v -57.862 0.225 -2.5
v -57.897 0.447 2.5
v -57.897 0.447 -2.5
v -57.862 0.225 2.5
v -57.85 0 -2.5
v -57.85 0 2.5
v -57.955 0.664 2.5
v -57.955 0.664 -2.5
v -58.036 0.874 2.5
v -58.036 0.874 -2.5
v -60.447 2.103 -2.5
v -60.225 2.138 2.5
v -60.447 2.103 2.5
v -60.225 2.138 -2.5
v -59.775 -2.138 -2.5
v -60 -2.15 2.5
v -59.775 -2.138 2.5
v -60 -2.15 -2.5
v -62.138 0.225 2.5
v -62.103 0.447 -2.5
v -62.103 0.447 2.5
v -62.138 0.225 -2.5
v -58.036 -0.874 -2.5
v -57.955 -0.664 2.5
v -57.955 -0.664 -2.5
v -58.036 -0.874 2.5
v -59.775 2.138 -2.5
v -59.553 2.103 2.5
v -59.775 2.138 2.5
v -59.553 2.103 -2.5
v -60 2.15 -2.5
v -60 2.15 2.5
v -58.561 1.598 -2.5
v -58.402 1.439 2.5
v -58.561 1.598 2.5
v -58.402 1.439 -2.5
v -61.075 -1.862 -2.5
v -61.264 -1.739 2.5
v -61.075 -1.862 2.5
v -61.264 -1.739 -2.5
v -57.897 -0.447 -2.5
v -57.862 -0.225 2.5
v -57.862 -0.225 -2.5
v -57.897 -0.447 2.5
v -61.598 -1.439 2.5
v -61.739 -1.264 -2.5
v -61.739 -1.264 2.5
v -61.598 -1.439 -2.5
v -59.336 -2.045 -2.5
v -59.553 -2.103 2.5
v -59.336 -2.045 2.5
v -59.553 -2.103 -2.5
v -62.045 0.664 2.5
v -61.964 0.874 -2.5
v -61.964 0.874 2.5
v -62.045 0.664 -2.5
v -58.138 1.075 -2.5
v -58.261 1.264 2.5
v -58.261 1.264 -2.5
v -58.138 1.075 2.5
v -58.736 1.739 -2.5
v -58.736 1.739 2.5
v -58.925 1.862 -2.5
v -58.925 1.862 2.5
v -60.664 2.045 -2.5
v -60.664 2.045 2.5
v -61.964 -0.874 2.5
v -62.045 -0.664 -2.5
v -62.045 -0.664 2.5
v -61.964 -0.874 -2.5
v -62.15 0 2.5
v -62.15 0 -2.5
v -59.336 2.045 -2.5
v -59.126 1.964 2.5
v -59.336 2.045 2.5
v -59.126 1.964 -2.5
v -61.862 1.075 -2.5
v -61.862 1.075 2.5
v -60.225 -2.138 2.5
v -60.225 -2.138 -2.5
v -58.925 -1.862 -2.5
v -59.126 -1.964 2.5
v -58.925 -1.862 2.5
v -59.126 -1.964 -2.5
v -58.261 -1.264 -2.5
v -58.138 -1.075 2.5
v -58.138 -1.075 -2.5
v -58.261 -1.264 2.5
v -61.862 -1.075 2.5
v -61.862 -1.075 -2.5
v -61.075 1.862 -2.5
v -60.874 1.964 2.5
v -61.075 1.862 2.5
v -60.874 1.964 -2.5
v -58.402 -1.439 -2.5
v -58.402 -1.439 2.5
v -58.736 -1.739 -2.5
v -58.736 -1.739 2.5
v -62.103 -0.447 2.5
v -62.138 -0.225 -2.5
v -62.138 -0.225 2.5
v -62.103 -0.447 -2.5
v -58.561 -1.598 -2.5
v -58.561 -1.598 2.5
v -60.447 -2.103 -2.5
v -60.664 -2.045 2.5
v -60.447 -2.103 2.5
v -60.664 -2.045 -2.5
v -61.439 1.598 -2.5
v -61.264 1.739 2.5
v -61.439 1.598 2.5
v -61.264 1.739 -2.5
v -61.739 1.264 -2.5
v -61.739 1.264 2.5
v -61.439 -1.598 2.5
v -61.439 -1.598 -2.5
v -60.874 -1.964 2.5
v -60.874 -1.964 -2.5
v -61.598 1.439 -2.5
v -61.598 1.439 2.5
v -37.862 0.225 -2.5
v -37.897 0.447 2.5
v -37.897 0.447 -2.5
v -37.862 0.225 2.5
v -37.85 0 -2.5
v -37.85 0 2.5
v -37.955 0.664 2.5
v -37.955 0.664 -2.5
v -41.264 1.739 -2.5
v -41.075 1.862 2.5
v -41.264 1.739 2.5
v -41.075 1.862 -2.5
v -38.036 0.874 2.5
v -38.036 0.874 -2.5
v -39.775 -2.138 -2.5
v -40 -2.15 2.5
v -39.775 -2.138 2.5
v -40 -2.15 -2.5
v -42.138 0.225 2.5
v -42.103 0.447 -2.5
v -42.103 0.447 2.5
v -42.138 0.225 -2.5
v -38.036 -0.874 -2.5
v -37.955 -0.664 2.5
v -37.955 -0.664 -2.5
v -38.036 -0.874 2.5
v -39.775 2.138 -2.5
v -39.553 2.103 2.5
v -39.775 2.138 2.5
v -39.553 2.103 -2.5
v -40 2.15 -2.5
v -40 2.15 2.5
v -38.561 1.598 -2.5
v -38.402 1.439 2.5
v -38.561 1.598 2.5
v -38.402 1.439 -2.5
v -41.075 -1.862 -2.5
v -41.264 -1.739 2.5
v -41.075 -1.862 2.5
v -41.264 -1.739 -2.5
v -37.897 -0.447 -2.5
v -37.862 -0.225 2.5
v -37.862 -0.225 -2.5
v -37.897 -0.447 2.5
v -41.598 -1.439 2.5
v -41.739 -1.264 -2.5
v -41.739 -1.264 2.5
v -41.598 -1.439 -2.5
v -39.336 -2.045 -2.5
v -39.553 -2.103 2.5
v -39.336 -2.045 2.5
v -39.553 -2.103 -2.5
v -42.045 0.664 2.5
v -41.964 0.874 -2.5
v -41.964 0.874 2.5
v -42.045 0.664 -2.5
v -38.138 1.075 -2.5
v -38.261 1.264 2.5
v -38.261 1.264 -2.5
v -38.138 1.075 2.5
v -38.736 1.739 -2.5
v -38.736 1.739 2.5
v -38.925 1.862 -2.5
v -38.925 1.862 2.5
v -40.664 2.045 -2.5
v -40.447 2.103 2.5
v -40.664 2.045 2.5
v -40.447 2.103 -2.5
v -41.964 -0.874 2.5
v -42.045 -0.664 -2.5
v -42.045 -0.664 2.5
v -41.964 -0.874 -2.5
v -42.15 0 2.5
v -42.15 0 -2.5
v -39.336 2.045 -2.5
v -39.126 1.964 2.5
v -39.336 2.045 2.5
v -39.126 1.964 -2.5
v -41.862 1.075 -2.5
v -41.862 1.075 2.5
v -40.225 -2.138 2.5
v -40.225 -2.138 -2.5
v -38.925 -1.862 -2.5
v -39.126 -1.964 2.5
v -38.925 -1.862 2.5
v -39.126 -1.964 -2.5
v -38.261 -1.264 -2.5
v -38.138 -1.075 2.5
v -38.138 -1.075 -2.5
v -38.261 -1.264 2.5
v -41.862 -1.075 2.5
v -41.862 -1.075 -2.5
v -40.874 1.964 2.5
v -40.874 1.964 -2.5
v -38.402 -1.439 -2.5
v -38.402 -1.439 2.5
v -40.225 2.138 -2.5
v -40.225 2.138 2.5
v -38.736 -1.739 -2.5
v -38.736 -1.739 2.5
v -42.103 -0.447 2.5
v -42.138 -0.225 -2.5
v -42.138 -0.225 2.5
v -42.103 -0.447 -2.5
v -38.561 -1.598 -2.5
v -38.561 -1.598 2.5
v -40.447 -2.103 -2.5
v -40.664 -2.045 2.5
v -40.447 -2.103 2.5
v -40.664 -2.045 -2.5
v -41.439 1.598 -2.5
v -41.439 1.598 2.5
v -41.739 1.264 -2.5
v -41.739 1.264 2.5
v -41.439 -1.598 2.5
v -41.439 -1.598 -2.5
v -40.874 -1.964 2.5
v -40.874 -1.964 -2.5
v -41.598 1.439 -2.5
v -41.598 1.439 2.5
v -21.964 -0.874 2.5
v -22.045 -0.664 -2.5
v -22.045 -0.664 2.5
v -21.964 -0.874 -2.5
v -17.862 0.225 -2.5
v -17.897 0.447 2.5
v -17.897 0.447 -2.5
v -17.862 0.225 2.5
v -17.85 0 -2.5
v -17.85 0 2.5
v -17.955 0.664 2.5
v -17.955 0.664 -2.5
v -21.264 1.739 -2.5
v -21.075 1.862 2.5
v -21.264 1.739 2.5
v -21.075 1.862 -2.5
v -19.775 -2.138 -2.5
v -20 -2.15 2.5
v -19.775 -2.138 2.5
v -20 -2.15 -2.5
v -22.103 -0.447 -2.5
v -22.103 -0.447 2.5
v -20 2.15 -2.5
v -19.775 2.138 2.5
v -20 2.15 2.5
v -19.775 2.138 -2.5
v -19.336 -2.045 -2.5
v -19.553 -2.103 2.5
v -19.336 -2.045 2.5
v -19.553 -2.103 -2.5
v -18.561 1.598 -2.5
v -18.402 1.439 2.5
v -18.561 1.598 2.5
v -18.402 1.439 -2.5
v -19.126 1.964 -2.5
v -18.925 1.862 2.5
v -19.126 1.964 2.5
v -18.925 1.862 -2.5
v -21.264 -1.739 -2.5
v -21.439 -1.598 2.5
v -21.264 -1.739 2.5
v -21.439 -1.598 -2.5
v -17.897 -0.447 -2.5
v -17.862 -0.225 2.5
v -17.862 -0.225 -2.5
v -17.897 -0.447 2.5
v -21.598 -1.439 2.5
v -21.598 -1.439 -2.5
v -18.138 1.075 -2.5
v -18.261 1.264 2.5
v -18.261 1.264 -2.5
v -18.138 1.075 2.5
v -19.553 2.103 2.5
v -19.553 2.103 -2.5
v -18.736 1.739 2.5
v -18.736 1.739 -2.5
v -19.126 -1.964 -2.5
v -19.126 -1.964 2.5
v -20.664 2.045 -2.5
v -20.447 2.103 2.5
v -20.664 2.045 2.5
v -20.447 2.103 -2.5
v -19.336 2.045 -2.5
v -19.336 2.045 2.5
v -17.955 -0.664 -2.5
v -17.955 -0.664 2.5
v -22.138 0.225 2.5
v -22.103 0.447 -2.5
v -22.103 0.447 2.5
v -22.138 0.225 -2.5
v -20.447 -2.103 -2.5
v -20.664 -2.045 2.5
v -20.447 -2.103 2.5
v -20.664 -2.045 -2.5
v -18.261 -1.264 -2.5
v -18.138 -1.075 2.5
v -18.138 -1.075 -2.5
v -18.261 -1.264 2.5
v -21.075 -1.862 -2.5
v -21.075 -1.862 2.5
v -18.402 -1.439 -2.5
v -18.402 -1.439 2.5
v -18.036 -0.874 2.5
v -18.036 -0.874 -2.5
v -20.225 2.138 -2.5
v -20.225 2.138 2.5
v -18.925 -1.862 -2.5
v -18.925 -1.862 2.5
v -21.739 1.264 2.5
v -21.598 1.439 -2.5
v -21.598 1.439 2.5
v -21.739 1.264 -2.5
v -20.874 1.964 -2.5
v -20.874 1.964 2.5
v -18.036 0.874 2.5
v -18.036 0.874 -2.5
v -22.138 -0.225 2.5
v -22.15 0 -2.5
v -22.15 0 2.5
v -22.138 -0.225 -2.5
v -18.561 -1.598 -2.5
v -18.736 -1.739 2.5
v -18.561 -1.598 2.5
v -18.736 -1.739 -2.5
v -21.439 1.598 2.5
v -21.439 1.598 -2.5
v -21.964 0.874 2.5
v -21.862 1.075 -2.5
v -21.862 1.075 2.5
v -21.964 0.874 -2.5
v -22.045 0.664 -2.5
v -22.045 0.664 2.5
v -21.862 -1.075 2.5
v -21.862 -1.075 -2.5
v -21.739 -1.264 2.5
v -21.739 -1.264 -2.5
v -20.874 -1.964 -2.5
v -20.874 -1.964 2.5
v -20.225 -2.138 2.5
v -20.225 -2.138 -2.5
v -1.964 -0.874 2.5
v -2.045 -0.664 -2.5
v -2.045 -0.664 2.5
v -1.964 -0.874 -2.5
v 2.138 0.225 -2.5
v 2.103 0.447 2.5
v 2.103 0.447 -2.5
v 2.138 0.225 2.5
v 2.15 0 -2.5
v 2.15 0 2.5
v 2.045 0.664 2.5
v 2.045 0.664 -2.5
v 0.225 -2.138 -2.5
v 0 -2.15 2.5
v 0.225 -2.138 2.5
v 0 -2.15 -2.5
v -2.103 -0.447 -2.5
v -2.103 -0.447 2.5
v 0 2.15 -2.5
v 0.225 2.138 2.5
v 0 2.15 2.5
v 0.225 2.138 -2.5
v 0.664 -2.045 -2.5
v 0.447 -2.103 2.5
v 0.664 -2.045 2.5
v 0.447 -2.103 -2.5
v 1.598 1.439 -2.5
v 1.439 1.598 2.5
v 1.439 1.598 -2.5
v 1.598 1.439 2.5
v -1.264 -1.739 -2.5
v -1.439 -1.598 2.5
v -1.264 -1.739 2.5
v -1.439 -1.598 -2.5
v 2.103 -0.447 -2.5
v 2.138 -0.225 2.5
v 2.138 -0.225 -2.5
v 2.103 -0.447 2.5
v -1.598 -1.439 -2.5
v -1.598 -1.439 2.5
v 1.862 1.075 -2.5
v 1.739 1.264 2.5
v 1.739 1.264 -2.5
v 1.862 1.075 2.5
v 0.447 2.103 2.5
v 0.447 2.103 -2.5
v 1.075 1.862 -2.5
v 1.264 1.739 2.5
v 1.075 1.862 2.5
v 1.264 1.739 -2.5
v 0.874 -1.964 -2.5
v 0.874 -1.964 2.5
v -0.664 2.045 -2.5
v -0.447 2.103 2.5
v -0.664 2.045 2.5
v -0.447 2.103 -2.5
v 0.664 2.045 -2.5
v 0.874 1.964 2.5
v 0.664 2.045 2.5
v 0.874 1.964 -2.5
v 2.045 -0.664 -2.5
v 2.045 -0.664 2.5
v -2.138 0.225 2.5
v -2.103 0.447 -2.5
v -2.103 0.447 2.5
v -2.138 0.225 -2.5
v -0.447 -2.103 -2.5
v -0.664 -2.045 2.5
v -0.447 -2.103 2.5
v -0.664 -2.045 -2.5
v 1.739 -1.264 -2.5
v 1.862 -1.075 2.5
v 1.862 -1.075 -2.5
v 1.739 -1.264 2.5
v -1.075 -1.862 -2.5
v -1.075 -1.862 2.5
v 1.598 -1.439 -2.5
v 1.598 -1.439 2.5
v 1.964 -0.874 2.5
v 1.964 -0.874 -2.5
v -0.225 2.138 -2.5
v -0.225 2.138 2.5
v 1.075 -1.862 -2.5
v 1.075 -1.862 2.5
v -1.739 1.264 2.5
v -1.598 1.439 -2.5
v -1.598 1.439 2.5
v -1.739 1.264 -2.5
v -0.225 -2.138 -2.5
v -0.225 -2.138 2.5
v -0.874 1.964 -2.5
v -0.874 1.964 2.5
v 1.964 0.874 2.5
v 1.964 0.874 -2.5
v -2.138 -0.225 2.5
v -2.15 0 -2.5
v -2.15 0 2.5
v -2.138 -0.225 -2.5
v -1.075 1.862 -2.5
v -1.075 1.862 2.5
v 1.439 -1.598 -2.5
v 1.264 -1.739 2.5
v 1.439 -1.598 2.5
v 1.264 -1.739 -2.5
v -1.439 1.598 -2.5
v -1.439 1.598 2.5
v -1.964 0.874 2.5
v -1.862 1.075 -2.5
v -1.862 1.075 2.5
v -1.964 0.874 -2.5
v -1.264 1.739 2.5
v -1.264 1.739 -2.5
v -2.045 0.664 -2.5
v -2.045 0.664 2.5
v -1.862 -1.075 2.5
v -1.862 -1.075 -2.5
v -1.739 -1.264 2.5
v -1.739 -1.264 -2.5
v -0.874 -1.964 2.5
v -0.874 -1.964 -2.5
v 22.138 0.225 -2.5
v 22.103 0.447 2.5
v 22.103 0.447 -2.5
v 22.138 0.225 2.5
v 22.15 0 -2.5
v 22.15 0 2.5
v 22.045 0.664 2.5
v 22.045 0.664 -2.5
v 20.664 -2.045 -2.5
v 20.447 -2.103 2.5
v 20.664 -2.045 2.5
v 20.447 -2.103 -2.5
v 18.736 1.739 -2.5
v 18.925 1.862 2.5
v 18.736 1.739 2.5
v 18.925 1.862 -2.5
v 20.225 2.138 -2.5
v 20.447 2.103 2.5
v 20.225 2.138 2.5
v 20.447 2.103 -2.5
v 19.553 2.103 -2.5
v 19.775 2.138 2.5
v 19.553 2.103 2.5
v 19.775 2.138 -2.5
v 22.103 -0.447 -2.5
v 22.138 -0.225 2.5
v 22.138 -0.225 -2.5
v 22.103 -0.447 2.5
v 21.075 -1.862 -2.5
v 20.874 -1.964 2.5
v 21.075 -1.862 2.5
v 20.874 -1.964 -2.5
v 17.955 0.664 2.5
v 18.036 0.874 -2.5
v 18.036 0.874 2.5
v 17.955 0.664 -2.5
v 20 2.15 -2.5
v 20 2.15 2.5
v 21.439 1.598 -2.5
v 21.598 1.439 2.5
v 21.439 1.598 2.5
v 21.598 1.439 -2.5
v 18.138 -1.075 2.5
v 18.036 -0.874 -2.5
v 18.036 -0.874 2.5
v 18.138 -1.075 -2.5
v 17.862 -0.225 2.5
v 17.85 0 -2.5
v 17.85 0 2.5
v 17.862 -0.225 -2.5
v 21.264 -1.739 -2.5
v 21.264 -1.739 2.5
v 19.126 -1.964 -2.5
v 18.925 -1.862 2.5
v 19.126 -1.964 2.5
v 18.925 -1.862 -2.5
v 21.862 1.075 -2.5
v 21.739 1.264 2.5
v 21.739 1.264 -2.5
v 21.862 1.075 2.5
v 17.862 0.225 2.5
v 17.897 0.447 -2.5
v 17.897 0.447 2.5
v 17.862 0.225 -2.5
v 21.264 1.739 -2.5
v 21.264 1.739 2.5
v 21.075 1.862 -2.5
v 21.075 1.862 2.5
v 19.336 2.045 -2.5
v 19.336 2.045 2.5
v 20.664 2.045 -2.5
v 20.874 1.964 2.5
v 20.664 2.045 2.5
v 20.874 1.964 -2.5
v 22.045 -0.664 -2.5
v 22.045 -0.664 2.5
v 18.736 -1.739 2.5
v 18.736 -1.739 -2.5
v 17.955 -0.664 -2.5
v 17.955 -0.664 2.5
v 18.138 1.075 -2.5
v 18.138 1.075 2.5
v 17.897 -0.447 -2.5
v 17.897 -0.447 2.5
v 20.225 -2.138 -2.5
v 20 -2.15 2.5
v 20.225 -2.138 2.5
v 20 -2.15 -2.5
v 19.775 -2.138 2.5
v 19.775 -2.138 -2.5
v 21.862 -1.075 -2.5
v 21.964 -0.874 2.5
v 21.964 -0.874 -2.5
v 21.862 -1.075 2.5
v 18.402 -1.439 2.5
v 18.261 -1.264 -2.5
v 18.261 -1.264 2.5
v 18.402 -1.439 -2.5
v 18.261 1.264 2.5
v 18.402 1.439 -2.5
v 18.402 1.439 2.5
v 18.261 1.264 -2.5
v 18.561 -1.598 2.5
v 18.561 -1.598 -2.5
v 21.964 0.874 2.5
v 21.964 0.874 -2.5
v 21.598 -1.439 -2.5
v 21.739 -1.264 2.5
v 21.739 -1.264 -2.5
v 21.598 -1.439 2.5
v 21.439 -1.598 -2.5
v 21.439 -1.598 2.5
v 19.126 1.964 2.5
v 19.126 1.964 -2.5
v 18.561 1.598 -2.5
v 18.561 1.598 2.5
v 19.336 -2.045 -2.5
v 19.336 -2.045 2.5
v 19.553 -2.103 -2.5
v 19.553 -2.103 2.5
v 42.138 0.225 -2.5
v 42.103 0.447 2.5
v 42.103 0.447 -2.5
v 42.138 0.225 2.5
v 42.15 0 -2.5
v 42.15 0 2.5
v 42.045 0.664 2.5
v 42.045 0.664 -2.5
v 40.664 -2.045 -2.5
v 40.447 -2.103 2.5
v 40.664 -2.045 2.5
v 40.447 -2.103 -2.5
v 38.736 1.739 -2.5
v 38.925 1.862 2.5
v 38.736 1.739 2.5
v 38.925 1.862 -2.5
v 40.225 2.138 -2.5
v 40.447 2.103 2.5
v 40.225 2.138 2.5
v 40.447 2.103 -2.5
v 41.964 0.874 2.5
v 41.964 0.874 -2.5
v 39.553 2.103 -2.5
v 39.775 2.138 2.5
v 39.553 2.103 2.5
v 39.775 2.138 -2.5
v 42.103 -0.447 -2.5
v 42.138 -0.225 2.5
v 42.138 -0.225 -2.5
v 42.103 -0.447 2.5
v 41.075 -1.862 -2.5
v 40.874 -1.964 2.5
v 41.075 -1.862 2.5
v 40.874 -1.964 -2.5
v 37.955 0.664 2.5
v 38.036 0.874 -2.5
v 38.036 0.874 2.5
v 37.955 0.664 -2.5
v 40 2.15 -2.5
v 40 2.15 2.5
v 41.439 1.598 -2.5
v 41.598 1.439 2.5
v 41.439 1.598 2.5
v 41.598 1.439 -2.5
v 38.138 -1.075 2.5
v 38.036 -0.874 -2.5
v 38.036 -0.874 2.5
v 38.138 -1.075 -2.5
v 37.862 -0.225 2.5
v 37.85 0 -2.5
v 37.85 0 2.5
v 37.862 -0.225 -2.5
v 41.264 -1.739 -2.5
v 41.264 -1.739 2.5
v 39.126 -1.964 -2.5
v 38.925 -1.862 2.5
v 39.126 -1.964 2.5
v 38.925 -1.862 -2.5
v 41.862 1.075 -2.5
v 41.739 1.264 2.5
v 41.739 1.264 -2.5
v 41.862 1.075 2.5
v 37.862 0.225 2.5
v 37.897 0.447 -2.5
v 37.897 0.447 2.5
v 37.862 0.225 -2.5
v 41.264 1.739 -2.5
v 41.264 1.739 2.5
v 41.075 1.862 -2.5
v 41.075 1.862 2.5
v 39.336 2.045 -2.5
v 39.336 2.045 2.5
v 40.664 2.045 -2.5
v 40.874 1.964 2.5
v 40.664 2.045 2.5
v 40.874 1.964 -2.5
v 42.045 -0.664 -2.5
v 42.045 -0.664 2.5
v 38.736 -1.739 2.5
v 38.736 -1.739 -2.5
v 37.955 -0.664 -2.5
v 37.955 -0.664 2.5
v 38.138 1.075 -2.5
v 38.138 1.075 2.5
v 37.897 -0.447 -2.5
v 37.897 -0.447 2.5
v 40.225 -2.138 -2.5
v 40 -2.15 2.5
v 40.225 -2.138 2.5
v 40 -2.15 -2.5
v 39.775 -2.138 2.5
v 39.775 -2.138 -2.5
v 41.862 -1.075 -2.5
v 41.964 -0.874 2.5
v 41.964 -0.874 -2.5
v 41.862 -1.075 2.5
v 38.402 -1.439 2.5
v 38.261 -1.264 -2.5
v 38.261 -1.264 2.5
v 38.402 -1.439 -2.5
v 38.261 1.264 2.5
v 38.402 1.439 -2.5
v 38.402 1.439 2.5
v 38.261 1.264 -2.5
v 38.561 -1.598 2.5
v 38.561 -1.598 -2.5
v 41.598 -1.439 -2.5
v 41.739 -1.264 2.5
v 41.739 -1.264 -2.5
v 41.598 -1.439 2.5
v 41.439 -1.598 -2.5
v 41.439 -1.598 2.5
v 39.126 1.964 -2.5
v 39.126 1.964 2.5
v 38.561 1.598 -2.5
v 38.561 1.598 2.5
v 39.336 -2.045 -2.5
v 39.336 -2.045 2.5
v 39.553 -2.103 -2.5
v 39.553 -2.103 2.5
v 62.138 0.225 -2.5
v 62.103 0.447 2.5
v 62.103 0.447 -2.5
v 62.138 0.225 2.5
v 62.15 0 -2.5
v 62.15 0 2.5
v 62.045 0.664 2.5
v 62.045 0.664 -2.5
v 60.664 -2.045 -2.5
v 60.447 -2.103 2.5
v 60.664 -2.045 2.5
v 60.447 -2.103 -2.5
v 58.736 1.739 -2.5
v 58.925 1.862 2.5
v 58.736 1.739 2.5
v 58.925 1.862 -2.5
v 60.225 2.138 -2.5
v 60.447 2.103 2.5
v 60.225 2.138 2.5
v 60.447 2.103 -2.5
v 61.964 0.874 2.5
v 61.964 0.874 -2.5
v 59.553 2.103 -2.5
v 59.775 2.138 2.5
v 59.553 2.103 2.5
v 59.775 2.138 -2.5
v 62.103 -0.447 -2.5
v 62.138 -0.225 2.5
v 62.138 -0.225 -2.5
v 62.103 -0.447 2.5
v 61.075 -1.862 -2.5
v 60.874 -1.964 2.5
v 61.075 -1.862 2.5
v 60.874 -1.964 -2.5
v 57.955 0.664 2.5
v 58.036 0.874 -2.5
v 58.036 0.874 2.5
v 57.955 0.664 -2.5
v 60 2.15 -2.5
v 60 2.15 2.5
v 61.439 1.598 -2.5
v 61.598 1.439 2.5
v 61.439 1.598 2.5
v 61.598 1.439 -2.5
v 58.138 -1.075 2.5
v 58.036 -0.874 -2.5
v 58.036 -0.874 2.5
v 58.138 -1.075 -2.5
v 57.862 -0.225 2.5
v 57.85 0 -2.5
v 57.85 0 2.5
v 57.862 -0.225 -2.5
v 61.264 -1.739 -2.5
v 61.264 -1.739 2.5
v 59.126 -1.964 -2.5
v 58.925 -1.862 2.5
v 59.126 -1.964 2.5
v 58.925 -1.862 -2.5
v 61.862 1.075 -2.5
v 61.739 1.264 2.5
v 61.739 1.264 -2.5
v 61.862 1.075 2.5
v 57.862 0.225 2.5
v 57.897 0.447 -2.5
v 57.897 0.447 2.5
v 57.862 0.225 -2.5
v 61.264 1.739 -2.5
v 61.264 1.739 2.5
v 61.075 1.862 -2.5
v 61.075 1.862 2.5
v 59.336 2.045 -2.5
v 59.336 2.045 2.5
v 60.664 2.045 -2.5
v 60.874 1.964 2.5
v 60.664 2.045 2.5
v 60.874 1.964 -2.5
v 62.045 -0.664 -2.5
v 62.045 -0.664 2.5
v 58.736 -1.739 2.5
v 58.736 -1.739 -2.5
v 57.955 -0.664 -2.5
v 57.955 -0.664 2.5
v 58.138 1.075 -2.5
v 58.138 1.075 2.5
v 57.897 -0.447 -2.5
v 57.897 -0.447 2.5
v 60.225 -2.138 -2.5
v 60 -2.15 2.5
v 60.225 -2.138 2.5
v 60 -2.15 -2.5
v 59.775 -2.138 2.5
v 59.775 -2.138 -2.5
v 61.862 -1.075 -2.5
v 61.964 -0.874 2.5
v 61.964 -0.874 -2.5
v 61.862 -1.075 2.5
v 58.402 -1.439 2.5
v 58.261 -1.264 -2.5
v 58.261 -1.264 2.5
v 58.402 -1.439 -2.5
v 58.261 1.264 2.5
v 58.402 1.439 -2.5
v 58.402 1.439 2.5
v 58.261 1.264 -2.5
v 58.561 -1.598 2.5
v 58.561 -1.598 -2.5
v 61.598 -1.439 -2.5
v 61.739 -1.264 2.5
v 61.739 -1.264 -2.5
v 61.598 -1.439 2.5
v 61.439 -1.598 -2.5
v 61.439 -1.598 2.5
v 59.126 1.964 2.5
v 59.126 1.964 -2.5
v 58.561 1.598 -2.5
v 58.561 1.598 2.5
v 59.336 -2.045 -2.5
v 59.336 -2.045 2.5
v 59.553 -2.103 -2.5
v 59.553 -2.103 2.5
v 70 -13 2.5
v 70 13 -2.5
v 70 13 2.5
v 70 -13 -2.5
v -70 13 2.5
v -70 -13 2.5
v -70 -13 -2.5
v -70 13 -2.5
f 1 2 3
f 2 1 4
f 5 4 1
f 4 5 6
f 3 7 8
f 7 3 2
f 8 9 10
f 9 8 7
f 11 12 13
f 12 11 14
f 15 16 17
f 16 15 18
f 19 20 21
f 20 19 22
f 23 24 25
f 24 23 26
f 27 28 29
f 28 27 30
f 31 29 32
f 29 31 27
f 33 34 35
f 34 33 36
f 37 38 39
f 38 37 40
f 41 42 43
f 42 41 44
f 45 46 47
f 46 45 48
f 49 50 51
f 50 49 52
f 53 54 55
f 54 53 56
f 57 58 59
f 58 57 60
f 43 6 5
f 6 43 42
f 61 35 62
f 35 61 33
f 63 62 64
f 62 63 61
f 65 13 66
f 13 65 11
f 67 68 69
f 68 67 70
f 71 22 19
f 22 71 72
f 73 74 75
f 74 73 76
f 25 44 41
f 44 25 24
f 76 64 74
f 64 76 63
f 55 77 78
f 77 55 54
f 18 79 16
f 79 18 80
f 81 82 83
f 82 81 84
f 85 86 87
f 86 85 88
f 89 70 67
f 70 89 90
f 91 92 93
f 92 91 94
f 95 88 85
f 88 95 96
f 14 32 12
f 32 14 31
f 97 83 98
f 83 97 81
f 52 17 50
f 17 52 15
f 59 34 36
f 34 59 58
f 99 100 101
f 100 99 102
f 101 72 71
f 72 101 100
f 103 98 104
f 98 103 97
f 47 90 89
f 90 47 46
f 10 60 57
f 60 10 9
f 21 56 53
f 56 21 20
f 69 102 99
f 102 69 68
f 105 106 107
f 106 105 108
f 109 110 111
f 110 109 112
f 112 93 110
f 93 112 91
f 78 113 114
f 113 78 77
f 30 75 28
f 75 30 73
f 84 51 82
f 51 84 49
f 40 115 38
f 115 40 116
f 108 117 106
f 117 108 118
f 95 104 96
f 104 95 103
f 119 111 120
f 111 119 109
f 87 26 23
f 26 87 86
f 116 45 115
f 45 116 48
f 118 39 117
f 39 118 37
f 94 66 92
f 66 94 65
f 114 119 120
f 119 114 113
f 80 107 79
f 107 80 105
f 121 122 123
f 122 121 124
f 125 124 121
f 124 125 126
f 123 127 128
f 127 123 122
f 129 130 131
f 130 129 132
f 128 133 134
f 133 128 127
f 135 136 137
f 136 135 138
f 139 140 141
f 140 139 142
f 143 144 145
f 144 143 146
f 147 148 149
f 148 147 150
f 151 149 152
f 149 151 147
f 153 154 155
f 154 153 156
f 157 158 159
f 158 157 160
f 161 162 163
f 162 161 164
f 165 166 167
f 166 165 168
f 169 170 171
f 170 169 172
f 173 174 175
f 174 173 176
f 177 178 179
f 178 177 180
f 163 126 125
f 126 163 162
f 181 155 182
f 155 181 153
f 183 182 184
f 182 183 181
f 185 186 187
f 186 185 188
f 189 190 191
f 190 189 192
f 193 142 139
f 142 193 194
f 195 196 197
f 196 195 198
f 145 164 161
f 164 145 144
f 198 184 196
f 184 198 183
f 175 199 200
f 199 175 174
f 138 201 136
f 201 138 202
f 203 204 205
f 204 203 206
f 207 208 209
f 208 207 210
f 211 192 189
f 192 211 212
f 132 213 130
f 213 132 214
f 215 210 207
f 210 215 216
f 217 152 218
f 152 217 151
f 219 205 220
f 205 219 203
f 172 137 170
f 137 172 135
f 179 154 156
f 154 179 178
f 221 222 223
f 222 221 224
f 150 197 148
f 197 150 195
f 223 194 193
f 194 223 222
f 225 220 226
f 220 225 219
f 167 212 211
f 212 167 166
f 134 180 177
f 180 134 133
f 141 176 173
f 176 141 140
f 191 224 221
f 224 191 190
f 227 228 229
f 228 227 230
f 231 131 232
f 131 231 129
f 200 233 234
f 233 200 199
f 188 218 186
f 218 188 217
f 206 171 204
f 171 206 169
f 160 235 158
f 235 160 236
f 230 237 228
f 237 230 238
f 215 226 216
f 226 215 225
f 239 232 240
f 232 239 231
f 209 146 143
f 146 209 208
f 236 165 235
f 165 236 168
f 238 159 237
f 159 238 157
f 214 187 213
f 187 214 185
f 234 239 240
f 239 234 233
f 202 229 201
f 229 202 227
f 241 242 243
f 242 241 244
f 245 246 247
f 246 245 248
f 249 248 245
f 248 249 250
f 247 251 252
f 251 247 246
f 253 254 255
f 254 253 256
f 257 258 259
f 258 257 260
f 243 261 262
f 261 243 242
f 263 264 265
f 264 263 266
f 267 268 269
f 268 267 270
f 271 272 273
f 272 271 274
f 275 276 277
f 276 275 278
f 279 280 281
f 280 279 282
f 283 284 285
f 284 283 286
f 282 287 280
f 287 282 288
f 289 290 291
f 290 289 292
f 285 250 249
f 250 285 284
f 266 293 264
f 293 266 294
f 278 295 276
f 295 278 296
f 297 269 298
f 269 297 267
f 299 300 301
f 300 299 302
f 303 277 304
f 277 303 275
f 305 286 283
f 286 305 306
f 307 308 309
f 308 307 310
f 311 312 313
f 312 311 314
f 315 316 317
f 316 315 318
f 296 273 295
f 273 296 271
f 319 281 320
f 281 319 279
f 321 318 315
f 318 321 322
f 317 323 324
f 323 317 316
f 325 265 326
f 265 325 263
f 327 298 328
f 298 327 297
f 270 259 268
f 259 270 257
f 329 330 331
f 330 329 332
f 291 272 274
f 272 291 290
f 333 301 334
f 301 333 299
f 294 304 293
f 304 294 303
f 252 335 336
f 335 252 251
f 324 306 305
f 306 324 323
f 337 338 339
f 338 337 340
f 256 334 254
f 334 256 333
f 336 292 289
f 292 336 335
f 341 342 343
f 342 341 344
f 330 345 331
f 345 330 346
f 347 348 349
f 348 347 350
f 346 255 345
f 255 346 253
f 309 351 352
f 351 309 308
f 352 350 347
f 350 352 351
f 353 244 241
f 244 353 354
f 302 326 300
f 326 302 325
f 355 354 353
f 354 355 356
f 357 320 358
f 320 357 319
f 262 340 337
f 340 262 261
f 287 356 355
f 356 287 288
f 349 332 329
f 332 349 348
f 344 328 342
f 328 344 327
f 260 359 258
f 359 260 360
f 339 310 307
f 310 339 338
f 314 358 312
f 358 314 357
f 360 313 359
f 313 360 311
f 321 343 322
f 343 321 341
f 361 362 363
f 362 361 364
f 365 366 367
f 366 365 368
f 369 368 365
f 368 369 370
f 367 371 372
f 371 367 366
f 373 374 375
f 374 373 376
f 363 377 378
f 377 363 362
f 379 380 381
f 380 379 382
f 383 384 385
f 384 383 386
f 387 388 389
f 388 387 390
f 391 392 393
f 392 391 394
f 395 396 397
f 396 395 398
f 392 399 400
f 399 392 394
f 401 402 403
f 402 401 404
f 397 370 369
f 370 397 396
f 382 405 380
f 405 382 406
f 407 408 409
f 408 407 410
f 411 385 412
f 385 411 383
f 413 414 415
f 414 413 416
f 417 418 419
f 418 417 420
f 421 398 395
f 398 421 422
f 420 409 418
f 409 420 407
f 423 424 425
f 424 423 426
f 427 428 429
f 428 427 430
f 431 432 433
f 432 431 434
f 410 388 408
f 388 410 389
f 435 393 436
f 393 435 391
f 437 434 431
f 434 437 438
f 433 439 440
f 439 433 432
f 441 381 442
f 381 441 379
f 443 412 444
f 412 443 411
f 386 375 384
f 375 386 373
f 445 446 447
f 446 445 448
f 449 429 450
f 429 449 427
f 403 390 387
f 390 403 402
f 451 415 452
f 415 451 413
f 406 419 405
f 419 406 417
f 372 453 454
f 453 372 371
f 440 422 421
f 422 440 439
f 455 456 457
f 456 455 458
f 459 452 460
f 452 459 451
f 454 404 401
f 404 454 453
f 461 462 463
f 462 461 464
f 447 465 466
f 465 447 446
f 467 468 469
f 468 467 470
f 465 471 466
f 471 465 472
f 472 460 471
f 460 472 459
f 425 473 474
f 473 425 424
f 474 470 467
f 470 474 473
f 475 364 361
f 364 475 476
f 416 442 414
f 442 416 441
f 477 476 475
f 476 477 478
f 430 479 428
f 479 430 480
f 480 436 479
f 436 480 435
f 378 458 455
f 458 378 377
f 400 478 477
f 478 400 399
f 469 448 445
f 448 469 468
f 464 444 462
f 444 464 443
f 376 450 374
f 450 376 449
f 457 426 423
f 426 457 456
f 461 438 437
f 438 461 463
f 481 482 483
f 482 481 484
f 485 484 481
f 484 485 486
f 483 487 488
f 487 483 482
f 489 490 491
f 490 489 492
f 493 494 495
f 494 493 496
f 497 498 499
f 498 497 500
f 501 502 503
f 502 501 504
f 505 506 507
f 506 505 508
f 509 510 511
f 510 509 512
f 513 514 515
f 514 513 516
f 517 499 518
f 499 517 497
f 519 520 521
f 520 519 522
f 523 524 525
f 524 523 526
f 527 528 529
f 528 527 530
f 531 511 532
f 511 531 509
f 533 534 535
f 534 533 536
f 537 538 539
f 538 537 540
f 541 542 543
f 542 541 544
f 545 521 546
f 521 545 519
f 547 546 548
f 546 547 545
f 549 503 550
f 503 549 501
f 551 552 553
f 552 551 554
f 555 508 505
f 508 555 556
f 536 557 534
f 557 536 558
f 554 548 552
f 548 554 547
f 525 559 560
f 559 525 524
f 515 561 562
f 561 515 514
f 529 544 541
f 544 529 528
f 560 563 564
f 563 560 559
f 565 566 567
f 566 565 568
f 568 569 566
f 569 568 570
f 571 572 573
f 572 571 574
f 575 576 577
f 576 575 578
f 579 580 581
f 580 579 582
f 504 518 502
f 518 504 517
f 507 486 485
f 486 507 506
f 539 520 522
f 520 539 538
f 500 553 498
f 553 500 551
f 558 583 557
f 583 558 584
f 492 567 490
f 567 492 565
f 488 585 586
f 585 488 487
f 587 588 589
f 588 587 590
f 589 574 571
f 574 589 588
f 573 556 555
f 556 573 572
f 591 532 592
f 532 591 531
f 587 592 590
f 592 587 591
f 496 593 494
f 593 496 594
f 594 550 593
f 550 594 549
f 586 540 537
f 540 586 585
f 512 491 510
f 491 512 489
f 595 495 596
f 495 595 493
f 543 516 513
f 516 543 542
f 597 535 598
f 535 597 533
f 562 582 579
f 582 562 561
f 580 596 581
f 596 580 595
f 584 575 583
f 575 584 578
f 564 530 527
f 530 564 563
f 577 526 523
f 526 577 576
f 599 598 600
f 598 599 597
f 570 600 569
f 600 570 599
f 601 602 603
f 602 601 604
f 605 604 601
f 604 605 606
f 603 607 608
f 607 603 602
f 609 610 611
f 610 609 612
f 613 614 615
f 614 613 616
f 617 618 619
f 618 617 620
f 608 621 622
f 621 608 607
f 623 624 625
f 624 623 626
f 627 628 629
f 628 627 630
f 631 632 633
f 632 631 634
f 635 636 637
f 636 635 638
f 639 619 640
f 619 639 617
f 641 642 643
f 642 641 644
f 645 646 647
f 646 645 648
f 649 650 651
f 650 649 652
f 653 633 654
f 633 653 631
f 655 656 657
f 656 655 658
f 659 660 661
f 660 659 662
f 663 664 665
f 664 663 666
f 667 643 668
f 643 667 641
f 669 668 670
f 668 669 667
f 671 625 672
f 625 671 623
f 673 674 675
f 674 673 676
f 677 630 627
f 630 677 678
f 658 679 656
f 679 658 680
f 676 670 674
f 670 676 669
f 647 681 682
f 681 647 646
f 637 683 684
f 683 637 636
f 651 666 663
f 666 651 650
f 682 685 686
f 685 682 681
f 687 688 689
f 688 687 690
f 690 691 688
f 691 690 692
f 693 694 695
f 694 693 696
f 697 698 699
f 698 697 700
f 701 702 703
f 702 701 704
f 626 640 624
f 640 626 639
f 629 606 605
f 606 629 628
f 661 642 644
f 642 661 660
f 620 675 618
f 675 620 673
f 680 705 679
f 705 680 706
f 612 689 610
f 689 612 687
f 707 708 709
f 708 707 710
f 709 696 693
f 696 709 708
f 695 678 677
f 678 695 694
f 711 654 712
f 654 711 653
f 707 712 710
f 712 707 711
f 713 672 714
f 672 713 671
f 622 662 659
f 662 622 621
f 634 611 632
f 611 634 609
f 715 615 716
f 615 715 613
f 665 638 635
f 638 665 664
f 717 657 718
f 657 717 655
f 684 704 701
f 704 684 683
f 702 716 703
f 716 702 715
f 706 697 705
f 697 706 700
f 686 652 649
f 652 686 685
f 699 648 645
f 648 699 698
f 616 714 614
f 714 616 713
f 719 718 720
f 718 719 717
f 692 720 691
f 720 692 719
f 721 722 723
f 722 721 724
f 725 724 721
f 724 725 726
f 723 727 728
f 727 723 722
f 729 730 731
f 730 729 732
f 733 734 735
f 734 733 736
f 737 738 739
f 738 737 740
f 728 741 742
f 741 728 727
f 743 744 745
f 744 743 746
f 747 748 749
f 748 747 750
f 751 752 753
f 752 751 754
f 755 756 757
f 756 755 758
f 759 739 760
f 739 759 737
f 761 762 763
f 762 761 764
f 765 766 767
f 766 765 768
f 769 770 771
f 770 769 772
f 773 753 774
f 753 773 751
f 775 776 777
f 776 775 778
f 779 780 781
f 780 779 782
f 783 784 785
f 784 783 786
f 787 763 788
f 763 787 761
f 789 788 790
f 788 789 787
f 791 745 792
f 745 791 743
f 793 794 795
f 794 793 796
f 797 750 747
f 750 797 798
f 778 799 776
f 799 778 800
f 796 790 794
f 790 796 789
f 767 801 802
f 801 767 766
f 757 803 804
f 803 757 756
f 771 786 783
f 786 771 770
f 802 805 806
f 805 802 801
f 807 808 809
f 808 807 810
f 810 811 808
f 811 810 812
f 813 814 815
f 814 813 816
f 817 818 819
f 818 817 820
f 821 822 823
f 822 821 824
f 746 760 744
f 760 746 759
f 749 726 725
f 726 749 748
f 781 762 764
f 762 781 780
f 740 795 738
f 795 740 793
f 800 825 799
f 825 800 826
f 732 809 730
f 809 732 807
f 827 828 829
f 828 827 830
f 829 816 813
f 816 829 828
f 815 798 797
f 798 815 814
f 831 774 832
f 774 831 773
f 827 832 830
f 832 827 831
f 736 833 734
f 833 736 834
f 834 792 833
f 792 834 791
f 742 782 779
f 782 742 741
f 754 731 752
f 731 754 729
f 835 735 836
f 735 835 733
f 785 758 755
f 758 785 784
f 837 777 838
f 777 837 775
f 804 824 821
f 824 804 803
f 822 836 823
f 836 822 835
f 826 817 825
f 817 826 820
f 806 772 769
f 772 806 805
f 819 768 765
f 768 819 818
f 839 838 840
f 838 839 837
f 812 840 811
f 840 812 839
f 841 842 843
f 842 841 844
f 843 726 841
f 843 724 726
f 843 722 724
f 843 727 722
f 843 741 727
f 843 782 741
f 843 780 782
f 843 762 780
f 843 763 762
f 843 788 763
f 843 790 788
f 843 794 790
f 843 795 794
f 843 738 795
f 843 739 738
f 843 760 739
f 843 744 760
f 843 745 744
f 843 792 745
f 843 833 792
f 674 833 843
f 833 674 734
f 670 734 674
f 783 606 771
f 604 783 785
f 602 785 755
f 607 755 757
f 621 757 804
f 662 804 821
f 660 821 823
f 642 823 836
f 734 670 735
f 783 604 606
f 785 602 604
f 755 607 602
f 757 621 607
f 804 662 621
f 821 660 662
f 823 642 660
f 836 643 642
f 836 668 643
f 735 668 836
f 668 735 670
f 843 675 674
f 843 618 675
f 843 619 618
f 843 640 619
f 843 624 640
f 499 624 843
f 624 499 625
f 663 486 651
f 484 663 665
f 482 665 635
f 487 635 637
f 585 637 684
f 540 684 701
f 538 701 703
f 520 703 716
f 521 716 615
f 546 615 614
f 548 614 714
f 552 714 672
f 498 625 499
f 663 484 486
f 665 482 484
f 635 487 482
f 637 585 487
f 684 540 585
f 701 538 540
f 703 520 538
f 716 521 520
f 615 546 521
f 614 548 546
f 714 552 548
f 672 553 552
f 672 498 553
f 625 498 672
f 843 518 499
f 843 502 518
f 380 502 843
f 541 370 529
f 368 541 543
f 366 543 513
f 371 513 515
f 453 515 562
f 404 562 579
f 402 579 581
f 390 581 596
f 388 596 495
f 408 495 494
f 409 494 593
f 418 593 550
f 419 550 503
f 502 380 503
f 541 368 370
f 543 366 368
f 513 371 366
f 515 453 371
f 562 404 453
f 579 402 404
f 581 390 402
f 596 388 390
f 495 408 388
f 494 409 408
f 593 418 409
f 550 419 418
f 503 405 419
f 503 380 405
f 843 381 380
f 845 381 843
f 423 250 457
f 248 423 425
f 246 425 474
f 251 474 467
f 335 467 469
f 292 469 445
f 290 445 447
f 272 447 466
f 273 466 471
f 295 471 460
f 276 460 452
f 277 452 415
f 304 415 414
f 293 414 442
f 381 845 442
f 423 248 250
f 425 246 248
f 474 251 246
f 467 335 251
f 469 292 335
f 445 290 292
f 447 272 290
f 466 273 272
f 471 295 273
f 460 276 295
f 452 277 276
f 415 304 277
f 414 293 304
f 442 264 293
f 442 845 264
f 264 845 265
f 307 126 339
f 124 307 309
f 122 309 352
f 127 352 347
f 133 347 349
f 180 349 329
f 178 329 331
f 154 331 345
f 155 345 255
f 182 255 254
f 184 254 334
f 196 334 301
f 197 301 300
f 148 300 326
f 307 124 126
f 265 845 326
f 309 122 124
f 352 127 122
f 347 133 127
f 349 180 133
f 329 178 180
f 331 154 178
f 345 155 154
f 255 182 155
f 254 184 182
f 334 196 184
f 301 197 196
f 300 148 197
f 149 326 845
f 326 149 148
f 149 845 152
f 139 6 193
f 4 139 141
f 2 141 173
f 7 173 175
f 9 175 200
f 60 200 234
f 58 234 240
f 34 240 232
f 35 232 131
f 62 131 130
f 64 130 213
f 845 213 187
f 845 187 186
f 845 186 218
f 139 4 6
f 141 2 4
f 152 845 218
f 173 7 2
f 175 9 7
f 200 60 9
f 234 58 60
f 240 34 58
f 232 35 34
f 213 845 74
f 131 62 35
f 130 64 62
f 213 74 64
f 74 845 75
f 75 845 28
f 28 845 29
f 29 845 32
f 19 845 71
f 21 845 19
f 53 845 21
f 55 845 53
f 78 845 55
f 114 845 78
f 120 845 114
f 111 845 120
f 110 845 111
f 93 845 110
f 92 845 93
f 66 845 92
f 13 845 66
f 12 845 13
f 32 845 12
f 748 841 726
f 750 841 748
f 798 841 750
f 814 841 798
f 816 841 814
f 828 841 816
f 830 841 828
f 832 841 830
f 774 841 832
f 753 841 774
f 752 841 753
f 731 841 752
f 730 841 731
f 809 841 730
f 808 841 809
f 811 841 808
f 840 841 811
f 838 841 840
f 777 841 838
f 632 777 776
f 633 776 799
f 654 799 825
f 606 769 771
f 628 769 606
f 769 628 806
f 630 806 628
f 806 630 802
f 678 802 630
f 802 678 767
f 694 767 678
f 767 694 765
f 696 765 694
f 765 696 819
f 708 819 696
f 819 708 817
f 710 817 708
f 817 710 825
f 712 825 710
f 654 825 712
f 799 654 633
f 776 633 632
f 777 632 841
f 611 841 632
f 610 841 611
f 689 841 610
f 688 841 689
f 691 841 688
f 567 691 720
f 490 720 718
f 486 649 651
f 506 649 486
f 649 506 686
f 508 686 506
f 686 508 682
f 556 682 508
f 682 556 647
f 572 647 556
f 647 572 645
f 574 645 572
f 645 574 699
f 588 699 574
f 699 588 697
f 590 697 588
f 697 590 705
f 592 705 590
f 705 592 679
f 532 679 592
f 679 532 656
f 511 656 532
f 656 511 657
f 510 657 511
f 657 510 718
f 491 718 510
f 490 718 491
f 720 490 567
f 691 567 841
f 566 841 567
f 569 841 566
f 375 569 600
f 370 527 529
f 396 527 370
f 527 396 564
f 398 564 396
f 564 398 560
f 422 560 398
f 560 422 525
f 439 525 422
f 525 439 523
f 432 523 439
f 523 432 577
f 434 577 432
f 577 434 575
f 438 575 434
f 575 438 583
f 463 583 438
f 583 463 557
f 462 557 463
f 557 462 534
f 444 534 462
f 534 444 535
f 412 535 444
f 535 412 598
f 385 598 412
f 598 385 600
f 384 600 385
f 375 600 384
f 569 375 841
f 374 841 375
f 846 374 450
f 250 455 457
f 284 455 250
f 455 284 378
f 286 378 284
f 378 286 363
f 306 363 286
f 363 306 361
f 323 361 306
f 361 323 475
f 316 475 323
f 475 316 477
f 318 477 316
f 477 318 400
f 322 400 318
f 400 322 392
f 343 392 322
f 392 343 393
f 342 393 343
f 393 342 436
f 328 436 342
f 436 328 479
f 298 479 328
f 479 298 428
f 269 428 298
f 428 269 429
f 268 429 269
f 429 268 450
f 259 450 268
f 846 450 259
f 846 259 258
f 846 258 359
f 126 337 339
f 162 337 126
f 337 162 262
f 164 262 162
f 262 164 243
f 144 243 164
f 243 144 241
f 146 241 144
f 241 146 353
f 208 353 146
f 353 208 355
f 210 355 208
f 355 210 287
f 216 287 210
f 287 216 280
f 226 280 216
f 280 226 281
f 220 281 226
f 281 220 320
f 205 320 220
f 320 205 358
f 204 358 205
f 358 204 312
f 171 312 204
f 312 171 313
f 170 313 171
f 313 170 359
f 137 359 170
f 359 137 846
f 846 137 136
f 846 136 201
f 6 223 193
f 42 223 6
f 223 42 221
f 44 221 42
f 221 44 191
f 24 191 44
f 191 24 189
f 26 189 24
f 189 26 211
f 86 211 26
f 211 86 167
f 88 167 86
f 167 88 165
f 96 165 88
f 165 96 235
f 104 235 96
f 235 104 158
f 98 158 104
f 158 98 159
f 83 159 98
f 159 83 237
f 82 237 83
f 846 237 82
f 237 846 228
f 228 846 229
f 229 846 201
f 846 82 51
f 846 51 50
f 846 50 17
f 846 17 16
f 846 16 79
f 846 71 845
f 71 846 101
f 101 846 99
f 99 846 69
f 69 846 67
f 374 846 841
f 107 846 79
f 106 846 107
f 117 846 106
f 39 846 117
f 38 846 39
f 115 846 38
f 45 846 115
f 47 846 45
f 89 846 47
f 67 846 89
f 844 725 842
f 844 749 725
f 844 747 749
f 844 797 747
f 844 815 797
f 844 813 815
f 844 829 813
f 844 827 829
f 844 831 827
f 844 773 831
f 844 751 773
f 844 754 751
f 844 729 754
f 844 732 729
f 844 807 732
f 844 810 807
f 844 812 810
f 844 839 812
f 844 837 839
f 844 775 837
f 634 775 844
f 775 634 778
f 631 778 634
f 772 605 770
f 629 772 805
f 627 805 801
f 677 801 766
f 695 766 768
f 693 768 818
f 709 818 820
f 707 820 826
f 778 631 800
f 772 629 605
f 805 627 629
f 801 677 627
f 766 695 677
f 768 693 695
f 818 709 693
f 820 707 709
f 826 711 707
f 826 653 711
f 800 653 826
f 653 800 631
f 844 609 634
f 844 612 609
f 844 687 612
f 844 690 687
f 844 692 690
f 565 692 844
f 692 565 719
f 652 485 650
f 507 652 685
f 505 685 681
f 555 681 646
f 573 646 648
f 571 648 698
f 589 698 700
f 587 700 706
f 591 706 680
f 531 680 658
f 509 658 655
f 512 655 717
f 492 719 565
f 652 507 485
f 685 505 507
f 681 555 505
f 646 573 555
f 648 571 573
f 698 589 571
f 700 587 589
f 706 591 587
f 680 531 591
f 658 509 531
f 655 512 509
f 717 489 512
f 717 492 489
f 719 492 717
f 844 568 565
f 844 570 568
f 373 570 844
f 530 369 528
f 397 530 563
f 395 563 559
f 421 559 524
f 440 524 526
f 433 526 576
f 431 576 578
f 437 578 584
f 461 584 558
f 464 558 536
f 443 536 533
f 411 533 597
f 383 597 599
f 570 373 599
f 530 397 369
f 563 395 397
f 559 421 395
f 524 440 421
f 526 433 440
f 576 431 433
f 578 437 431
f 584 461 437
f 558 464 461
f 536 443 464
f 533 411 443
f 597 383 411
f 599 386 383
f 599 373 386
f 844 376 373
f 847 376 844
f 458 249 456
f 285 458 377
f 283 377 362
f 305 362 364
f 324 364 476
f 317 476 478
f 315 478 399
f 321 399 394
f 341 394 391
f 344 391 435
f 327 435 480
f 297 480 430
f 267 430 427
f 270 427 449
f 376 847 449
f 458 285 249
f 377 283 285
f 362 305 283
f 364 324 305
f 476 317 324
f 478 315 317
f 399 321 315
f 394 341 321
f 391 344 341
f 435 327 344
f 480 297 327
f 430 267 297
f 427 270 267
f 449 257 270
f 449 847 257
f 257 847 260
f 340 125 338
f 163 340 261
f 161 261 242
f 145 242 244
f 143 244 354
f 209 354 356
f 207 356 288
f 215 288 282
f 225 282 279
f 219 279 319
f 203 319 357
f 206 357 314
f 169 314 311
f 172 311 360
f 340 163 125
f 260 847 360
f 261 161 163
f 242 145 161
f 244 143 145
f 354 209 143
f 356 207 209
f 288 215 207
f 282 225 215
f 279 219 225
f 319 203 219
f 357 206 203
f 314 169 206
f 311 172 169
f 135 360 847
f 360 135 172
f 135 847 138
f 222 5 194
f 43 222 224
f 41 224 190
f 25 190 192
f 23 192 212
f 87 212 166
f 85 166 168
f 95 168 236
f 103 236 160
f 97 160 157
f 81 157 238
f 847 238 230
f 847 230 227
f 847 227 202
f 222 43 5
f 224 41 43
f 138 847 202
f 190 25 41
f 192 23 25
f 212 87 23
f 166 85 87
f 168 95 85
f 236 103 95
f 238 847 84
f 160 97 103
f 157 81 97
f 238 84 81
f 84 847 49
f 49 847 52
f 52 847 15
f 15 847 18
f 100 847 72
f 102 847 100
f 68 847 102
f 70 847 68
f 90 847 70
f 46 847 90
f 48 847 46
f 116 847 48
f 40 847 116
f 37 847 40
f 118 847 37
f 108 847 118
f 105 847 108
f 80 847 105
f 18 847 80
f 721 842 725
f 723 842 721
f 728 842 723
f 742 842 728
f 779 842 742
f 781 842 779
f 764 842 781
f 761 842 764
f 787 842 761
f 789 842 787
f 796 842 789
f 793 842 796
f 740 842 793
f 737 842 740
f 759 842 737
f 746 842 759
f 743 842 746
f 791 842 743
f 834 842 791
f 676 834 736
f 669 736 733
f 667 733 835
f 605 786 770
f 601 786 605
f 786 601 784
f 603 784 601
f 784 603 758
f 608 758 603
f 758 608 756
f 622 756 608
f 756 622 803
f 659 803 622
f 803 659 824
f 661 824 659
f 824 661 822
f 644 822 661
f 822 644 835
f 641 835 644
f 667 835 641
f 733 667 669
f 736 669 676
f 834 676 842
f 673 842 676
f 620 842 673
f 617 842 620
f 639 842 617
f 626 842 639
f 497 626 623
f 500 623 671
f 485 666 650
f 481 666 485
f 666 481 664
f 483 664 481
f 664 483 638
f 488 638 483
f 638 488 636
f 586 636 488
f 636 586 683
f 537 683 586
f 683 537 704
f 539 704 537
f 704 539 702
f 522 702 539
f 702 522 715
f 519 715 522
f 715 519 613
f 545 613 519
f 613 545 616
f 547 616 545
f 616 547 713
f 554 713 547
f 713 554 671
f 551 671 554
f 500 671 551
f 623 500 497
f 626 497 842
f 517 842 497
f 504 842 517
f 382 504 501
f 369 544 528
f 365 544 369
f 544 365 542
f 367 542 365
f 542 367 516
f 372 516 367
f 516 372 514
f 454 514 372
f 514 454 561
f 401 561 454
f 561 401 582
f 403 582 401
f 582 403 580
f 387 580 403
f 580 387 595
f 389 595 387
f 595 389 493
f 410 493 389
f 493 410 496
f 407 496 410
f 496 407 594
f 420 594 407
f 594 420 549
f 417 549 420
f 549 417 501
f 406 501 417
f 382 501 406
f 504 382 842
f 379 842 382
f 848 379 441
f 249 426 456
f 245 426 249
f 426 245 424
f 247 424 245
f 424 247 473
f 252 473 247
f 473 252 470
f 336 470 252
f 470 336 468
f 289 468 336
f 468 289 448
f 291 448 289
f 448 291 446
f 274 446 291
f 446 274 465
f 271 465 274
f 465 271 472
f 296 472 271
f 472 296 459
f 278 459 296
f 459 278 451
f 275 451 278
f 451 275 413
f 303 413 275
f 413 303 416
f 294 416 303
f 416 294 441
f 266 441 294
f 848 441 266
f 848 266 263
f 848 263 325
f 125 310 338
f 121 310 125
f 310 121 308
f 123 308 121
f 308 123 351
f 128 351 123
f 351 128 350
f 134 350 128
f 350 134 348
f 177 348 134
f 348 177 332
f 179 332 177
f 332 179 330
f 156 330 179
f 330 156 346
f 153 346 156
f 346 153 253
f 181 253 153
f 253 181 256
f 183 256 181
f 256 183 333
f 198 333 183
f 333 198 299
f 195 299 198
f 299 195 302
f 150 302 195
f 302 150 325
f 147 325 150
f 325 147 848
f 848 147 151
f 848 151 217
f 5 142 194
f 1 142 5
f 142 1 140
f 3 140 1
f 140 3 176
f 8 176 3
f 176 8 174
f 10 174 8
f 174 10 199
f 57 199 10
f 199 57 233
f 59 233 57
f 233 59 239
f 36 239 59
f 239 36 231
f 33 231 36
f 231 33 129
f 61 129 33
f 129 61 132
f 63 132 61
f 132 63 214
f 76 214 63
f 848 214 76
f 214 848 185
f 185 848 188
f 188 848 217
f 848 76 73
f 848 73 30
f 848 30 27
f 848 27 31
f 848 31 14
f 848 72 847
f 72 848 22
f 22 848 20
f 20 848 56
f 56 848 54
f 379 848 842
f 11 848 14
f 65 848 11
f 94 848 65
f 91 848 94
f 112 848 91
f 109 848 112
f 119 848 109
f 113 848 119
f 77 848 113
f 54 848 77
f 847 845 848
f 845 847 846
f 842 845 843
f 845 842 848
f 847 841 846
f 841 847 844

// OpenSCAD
// Linear rail spacer strip.
$fn = 60;
eps = 0.02;
length = 140;
width = 26;
thickness = 5;
hole_pitch = 20;
difference() {
    cube([length,width,thickness],center=true);
    for (x=[-length/2+10:hole_pitch:length/2-10]) translate([x,0,-thickness/2-eps]) cylinder(d=4.3,h=thickness+2*eps);
}
